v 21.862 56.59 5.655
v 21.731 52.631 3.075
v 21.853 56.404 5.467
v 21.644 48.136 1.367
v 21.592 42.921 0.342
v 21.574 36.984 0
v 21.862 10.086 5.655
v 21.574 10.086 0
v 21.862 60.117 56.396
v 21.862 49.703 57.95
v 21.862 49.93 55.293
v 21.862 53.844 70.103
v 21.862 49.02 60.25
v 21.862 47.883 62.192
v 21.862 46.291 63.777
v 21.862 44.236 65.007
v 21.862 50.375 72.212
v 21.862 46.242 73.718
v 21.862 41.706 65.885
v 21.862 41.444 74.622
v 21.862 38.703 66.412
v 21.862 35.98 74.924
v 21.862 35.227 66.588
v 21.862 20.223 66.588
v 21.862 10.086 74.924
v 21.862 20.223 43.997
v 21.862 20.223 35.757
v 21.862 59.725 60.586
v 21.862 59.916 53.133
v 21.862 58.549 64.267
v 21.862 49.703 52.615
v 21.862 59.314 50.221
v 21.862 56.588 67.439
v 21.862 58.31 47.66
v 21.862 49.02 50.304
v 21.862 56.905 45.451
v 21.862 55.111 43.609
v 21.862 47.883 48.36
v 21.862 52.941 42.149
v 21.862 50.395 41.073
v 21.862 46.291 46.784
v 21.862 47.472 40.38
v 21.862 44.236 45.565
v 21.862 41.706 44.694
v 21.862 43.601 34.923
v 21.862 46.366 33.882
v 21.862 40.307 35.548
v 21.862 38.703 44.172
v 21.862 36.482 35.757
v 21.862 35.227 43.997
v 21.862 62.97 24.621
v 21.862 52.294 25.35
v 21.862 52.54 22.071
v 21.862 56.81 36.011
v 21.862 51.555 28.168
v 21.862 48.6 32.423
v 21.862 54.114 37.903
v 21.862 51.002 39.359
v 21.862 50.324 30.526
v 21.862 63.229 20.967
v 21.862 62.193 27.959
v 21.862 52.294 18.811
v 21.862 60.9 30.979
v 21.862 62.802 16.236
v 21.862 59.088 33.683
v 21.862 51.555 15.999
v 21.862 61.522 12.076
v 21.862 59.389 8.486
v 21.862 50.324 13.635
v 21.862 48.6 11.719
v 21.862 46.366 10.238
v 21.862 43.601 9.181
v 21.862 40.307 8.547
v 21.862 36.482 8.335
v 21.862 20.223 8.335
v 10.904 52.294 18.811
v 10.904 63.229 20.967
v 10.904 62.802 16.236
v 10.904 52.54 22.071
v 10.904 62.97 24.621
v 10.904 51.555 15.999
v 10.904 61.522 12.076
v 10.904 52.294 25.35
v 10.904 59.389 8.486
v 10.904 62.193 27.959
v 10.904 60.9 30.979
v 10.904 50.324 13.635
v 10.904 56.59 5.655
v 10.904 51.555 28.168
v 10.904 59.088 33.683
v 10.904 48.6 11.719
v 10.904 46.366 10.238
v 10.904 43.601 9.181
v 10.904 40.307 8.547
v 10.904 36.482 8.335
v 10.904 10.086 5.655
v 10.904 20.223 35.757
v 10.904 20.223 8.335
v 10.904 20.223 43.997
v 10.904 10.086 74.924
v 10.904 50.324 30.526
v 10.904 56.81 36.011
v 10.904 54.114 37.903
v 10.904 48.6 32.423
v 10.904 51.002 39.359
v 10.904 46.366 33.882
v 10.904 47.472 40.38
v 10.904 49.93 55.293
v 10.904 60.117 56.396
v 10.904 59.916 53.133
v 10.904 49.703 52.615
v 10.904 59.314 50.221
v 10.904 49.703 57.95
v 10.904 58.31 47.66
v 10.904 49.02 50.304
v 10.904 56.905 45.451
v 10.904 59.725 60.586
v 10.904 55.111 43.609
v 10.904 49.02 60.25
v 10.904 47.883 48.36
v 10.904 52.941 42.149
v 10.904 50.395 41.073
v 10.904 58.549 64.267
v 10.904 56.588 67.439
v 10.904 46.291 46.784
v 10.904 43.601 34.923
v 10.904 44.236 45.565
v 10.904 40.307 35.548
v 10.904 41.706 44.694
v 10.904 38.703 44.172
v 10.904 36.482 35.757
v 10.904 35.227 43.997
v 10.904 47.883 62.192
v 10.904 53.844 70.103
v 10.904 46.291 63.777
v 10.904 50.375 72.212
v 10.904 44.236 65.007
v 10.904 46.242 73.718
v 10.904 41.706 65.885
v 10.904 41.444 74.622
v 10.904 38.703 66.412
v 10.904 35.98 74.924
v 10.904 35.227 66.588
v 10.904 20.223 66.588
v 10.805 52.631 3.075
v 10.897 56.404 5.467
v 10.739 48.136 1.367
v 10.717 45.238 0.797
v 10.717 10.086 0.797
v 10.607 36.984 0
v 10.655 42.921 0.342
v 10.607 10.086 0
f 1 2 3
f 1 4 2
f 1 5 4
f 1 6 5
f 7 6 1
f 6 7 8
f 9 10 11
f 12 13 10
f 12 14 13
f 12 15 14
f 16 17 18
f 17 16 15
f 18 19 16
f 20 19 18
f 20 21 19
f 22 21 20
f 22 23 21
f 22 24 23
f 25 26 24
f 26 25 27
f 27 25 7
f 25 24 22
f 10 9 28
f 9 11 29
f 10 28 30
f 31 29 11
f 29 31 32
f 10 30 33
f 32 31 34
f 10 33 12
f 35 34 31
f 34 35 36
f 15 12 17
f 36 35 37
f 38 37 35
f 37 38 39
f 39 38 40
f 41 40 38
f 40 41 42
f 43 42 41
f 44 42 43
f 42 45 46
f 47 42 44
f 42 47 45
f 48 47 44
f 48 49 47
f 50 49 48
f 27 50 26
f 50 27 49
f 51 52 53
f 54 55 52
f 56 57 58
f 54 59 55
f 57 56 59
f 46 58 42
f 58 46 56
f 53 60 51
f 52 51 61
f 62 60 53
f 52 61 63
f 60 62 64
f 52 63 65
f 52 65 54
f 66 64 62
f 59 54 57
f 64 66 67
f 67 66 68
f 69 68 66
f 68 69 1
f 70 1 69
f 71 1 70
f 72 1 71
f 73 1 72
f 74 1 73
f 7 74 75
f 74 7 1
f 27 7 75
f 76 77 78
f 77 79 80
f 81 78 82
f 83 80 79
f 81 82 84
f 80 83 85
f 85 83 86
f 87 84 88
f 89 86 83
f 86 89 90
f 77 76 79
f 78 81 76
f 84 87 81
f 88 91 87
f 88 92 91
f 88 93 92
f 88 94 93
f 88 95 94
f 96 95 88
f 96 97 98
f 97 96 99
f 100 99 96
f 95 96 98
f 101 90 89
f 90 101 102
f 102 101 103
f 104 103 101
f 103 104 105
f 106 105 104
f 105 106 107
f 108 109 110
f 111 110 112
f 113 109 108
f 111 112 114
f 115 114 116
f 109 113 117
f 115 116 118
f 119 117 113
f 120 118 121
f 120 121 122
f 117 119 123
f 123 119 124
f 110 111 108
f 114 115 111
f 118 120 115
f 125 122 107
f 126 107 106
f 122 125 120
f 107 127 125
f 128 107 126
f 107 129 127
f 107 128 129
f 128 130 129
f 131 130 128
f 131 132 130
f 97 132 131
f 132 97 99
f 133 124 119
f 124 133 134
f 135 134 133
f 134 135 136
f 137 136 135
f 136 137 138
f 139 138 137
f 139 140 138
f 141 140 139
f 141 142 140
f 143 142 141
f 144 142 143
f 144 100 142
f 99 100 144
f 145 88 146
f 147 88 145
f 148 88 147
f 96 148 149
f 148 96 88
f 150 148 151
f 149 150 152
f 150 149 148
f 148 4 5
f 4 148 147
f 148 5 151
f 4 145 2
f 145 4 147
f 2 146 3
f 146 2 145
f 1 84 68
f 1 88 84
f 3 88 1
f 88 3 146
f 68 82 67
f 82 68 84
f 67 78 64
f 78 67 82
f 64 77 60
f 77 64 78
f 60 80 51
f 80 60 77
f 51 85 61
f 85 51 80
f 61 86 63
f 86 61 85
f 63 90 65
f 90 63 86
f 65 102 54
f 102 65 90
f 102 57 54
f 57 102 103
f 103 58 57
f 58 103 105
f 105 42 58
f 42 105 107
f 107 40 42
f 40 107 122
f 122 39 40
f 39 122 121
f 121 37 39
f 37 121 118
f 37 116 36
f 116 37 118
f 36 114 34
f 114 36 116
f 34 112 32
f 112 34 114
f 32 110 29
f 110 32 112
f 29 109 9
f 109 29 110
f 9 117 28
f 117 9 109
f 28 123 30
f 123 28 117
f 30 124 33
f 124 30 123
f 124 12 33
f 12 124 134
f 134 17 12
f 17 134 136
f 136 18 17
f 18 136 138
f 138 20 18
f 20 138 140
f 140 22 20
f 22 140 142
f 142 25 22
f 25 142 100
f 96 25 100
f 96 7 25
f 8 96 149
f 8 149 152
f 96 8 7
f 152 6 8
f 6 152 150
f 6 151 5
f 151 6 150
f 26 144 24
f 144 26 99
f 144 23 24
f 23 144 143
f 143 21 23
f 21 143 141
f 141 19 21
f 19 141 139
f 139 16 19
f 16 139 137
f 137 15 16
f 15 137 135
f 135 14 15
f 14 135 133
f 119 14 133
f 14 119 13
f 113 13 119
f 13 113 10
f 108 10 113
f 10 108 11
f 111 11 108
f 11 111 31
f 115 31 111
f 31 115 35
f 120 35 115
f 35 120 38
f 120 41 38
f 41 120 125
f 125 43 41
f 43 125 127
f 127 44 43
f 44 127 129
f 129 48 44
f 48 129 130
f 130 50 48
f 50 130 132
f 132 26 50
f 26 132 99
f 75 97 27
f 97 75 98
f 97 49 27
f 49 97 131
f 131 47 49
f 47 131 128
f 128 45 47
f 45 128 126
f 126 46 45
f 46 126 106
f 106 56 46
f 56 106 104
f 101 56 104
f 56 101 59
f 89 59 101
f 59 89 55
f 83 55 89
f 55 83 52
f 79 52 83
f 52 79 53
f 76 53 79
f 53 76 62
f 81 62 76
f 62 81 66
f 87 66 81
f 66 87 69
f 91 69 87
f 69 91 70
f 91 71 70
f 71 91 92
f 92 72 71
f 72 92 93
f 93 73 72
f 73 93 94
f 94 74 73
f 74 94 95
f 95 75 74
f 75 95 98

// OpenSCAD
myfont = "Neuropol";

intersection() {
    translate([0, 100, 0]) rotate([90, 0, 0])
      linear_extrude(100, convexity=10) text("J", size=80, font=myfont);
    // translate([0, 100, 0]) 
    rotate([90, 0, 90])
      linear_extrude(100, convexity=10) text("B", size=74, font=myfont);
}
